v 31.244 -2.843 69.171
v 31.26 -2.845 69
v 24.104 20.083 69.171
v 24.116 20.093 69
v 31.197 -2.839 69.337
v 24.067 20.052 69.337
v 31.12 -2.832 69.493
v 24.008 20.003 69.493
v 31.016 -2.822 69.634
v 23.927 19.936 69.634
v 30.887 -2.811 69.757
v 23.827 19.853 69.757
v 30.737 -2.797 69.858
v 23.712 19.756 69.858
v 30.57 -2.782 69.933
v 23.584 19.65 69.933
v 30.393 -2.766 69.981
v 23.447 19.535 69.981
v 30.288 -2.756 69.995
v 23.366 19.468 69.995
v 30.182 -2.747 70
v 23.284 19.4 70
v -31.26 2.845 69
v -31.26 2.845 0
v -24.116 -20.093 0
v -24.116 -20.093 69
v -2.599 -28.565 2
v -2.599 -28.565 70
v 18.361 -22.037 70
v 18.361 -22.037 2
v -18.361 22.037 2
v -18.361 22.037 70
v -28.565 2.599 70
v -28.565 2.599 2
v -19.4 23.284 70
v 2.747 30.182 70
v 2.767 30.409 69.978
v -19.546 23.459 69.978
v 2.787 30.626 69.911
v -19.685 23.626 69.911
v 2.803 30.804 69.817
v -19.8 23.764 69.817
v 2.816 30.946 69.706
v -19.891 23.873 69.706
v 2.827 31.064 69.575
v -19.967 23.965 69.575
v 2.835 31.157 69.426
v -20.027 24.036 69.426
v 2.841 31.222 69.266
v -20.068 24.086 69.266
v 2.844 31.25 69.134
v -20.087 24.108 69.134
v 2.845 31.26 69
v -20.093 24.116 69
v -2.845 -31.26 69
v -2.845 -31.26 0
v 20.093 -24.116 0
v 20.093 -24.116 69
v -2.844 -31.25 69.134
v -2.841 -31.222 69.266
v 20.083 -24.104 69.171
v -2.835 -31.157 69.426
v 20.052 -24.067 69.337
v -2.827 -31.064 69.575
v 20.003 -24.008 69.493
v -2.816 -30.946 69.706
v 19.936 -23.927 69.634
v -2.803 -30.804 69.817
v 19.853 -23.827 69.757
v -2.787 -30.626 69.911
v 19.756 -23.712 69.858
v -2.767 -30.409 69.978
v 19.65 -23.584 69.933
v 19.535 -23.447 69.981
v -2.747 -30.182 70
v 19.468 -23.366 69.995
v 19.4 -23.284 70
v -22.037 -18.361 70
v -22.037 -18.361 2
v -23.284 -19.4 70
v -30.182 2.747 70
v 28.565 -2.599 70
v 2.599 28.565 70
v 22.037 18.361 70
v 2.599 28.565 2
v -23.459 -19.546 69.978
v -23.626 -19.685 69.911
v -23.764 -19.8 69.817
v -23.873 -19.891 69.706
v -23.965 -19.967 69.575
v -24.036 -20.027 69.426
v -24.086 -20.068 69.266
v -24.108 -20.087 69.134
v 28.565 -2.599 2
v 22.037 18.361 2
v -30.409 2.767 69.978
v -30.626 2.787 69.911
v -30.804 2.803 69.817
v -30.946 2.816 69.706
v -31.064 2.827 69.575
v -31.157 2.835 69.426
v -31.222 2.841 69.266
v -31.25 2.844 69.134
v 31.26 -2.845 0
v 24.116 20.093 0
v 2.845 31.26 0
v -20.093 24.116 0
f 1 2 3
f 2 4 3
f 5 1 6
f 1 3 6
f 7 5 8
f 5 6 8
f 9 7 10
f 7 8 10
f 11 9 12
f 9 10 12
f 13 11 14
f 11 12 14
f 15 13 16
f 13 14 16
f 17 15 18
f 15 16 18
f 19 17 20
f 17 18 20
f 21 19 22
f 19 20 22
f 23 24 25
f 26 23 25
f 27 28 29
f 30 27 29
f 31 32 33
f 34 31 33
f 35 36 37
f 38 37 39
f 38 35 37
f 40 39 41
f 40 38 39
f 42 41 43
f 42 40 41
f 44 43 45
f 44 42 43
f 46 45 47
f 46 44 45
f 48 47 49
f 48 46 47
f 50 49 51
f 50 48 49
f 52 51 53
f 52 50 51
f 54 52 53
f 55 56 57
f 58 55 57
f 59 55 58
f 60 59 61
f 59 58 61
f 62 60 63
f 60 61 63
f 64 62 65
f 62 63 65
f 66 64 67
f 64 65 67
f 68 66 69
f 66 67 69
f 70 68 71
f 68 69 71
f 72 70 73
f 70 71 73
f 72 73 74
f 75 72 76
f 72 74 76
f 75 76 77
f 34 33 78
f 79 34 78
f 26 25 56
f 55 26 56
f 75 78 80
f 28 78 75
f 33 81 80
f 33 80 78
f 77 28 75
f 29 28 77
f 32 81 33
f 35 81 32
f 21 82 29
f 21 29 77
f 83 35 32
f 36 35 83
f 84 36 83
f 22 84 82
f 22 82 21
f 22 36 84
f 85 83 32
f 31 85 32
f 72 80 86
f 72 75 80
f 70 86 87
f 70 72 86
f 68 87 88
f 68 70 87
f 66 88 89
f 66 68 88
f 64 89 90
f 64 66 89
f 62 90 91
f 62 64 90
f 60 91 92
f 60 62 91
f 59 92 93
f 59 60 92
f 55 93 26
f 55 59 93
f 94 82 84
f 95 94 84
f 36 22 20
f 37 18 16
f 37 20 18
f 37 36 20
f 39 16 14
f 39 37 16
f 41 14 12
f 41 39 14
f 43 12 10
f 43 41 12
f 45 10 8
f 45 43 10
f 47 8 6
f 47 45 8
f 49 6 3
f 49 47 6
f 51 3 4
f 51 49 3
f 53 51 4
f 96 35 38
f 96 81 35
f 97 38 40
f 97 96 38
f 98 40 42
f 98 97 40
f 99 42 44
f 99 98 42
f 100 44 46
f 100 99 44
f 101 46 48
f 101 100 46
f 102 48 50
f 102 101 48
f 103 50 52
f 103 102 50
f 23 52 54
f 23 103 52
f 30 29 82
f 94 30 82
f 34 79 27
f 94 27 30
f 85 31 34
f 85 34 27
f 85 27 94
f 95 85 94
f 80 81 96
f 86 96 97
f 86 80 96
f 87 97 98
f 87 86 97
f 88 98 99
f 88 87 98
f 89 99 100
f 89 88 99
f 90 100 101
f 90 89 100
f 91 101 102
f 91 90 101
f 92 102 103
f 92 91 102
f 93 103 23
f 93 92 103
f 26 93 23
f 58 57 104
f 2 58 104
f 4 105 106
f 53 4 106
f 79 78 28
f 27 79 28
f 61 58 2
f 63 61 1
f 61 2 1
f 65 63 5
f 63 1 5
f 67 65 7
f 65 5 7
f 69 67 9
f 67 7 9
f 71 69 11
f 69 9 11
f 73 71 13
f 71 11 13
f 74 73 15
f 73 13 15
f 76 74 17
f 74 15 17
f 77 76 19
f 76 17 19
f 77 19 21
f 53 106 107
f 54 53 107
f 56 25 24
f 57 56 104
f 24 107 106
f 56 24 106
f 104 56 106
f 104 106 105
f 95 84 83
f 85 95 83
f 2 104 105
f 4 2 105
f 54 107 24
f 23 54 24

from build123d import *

# Parameters (mm, degrees)
F1_DEPTH = 70
F3_DEPTH = 68
F4_R     = 1


with BuildPart() as f1:
    # F0 (on Top) → F1 (new body)
    with BuildSketch(Plane.XY):
        Polygon((20.09286, -24.115758), (31.260213, -2.844618), (24.115758, 20.09286), (2.844618, 31.260213), (-20.09286, 24.115758), (-31.260213, 2.844618), (-24.115758, -20.09286), (-2.844618, -31.260213), align=None)
    extrude(amount=F1_DEPTH)

    # F2 (on face) → F3 (cut)
    with BuildSketch(Plane.XY.offset(70)):
        Polygon((18.360717, -22.036813), (28.565367, -2.599392), (22.036813, 18.360717), (2.599392, 28.565367), (-18.360717, 22.036813), (-28.565367, 2.599392), (-22.036813, -18.360717), (-2.599392, -28.565367), align=None)
    extrude(amount=-F3_DEPTH, mode=Mode.SUBTRACT)

    # F4
    f4_edges = [f1.edges().sort_by_distance(p)[0] for p in [
        (25.676537, -13.480188, 70),
        (27.687985, 8.624121, 70),
        (13.480188, 25.676537, 70),
        (-8.624121, 27.687985, 70),
        (-25.676537, 13.480188, 70),
        (-27.687985, -8.624121, 70),
        (-13.480188, -25.676537, 70),
        (8.624121, -27.687985, 70),
    ]]
    fillet(f4_edges, radius=F4_R)


solid = f1.part
